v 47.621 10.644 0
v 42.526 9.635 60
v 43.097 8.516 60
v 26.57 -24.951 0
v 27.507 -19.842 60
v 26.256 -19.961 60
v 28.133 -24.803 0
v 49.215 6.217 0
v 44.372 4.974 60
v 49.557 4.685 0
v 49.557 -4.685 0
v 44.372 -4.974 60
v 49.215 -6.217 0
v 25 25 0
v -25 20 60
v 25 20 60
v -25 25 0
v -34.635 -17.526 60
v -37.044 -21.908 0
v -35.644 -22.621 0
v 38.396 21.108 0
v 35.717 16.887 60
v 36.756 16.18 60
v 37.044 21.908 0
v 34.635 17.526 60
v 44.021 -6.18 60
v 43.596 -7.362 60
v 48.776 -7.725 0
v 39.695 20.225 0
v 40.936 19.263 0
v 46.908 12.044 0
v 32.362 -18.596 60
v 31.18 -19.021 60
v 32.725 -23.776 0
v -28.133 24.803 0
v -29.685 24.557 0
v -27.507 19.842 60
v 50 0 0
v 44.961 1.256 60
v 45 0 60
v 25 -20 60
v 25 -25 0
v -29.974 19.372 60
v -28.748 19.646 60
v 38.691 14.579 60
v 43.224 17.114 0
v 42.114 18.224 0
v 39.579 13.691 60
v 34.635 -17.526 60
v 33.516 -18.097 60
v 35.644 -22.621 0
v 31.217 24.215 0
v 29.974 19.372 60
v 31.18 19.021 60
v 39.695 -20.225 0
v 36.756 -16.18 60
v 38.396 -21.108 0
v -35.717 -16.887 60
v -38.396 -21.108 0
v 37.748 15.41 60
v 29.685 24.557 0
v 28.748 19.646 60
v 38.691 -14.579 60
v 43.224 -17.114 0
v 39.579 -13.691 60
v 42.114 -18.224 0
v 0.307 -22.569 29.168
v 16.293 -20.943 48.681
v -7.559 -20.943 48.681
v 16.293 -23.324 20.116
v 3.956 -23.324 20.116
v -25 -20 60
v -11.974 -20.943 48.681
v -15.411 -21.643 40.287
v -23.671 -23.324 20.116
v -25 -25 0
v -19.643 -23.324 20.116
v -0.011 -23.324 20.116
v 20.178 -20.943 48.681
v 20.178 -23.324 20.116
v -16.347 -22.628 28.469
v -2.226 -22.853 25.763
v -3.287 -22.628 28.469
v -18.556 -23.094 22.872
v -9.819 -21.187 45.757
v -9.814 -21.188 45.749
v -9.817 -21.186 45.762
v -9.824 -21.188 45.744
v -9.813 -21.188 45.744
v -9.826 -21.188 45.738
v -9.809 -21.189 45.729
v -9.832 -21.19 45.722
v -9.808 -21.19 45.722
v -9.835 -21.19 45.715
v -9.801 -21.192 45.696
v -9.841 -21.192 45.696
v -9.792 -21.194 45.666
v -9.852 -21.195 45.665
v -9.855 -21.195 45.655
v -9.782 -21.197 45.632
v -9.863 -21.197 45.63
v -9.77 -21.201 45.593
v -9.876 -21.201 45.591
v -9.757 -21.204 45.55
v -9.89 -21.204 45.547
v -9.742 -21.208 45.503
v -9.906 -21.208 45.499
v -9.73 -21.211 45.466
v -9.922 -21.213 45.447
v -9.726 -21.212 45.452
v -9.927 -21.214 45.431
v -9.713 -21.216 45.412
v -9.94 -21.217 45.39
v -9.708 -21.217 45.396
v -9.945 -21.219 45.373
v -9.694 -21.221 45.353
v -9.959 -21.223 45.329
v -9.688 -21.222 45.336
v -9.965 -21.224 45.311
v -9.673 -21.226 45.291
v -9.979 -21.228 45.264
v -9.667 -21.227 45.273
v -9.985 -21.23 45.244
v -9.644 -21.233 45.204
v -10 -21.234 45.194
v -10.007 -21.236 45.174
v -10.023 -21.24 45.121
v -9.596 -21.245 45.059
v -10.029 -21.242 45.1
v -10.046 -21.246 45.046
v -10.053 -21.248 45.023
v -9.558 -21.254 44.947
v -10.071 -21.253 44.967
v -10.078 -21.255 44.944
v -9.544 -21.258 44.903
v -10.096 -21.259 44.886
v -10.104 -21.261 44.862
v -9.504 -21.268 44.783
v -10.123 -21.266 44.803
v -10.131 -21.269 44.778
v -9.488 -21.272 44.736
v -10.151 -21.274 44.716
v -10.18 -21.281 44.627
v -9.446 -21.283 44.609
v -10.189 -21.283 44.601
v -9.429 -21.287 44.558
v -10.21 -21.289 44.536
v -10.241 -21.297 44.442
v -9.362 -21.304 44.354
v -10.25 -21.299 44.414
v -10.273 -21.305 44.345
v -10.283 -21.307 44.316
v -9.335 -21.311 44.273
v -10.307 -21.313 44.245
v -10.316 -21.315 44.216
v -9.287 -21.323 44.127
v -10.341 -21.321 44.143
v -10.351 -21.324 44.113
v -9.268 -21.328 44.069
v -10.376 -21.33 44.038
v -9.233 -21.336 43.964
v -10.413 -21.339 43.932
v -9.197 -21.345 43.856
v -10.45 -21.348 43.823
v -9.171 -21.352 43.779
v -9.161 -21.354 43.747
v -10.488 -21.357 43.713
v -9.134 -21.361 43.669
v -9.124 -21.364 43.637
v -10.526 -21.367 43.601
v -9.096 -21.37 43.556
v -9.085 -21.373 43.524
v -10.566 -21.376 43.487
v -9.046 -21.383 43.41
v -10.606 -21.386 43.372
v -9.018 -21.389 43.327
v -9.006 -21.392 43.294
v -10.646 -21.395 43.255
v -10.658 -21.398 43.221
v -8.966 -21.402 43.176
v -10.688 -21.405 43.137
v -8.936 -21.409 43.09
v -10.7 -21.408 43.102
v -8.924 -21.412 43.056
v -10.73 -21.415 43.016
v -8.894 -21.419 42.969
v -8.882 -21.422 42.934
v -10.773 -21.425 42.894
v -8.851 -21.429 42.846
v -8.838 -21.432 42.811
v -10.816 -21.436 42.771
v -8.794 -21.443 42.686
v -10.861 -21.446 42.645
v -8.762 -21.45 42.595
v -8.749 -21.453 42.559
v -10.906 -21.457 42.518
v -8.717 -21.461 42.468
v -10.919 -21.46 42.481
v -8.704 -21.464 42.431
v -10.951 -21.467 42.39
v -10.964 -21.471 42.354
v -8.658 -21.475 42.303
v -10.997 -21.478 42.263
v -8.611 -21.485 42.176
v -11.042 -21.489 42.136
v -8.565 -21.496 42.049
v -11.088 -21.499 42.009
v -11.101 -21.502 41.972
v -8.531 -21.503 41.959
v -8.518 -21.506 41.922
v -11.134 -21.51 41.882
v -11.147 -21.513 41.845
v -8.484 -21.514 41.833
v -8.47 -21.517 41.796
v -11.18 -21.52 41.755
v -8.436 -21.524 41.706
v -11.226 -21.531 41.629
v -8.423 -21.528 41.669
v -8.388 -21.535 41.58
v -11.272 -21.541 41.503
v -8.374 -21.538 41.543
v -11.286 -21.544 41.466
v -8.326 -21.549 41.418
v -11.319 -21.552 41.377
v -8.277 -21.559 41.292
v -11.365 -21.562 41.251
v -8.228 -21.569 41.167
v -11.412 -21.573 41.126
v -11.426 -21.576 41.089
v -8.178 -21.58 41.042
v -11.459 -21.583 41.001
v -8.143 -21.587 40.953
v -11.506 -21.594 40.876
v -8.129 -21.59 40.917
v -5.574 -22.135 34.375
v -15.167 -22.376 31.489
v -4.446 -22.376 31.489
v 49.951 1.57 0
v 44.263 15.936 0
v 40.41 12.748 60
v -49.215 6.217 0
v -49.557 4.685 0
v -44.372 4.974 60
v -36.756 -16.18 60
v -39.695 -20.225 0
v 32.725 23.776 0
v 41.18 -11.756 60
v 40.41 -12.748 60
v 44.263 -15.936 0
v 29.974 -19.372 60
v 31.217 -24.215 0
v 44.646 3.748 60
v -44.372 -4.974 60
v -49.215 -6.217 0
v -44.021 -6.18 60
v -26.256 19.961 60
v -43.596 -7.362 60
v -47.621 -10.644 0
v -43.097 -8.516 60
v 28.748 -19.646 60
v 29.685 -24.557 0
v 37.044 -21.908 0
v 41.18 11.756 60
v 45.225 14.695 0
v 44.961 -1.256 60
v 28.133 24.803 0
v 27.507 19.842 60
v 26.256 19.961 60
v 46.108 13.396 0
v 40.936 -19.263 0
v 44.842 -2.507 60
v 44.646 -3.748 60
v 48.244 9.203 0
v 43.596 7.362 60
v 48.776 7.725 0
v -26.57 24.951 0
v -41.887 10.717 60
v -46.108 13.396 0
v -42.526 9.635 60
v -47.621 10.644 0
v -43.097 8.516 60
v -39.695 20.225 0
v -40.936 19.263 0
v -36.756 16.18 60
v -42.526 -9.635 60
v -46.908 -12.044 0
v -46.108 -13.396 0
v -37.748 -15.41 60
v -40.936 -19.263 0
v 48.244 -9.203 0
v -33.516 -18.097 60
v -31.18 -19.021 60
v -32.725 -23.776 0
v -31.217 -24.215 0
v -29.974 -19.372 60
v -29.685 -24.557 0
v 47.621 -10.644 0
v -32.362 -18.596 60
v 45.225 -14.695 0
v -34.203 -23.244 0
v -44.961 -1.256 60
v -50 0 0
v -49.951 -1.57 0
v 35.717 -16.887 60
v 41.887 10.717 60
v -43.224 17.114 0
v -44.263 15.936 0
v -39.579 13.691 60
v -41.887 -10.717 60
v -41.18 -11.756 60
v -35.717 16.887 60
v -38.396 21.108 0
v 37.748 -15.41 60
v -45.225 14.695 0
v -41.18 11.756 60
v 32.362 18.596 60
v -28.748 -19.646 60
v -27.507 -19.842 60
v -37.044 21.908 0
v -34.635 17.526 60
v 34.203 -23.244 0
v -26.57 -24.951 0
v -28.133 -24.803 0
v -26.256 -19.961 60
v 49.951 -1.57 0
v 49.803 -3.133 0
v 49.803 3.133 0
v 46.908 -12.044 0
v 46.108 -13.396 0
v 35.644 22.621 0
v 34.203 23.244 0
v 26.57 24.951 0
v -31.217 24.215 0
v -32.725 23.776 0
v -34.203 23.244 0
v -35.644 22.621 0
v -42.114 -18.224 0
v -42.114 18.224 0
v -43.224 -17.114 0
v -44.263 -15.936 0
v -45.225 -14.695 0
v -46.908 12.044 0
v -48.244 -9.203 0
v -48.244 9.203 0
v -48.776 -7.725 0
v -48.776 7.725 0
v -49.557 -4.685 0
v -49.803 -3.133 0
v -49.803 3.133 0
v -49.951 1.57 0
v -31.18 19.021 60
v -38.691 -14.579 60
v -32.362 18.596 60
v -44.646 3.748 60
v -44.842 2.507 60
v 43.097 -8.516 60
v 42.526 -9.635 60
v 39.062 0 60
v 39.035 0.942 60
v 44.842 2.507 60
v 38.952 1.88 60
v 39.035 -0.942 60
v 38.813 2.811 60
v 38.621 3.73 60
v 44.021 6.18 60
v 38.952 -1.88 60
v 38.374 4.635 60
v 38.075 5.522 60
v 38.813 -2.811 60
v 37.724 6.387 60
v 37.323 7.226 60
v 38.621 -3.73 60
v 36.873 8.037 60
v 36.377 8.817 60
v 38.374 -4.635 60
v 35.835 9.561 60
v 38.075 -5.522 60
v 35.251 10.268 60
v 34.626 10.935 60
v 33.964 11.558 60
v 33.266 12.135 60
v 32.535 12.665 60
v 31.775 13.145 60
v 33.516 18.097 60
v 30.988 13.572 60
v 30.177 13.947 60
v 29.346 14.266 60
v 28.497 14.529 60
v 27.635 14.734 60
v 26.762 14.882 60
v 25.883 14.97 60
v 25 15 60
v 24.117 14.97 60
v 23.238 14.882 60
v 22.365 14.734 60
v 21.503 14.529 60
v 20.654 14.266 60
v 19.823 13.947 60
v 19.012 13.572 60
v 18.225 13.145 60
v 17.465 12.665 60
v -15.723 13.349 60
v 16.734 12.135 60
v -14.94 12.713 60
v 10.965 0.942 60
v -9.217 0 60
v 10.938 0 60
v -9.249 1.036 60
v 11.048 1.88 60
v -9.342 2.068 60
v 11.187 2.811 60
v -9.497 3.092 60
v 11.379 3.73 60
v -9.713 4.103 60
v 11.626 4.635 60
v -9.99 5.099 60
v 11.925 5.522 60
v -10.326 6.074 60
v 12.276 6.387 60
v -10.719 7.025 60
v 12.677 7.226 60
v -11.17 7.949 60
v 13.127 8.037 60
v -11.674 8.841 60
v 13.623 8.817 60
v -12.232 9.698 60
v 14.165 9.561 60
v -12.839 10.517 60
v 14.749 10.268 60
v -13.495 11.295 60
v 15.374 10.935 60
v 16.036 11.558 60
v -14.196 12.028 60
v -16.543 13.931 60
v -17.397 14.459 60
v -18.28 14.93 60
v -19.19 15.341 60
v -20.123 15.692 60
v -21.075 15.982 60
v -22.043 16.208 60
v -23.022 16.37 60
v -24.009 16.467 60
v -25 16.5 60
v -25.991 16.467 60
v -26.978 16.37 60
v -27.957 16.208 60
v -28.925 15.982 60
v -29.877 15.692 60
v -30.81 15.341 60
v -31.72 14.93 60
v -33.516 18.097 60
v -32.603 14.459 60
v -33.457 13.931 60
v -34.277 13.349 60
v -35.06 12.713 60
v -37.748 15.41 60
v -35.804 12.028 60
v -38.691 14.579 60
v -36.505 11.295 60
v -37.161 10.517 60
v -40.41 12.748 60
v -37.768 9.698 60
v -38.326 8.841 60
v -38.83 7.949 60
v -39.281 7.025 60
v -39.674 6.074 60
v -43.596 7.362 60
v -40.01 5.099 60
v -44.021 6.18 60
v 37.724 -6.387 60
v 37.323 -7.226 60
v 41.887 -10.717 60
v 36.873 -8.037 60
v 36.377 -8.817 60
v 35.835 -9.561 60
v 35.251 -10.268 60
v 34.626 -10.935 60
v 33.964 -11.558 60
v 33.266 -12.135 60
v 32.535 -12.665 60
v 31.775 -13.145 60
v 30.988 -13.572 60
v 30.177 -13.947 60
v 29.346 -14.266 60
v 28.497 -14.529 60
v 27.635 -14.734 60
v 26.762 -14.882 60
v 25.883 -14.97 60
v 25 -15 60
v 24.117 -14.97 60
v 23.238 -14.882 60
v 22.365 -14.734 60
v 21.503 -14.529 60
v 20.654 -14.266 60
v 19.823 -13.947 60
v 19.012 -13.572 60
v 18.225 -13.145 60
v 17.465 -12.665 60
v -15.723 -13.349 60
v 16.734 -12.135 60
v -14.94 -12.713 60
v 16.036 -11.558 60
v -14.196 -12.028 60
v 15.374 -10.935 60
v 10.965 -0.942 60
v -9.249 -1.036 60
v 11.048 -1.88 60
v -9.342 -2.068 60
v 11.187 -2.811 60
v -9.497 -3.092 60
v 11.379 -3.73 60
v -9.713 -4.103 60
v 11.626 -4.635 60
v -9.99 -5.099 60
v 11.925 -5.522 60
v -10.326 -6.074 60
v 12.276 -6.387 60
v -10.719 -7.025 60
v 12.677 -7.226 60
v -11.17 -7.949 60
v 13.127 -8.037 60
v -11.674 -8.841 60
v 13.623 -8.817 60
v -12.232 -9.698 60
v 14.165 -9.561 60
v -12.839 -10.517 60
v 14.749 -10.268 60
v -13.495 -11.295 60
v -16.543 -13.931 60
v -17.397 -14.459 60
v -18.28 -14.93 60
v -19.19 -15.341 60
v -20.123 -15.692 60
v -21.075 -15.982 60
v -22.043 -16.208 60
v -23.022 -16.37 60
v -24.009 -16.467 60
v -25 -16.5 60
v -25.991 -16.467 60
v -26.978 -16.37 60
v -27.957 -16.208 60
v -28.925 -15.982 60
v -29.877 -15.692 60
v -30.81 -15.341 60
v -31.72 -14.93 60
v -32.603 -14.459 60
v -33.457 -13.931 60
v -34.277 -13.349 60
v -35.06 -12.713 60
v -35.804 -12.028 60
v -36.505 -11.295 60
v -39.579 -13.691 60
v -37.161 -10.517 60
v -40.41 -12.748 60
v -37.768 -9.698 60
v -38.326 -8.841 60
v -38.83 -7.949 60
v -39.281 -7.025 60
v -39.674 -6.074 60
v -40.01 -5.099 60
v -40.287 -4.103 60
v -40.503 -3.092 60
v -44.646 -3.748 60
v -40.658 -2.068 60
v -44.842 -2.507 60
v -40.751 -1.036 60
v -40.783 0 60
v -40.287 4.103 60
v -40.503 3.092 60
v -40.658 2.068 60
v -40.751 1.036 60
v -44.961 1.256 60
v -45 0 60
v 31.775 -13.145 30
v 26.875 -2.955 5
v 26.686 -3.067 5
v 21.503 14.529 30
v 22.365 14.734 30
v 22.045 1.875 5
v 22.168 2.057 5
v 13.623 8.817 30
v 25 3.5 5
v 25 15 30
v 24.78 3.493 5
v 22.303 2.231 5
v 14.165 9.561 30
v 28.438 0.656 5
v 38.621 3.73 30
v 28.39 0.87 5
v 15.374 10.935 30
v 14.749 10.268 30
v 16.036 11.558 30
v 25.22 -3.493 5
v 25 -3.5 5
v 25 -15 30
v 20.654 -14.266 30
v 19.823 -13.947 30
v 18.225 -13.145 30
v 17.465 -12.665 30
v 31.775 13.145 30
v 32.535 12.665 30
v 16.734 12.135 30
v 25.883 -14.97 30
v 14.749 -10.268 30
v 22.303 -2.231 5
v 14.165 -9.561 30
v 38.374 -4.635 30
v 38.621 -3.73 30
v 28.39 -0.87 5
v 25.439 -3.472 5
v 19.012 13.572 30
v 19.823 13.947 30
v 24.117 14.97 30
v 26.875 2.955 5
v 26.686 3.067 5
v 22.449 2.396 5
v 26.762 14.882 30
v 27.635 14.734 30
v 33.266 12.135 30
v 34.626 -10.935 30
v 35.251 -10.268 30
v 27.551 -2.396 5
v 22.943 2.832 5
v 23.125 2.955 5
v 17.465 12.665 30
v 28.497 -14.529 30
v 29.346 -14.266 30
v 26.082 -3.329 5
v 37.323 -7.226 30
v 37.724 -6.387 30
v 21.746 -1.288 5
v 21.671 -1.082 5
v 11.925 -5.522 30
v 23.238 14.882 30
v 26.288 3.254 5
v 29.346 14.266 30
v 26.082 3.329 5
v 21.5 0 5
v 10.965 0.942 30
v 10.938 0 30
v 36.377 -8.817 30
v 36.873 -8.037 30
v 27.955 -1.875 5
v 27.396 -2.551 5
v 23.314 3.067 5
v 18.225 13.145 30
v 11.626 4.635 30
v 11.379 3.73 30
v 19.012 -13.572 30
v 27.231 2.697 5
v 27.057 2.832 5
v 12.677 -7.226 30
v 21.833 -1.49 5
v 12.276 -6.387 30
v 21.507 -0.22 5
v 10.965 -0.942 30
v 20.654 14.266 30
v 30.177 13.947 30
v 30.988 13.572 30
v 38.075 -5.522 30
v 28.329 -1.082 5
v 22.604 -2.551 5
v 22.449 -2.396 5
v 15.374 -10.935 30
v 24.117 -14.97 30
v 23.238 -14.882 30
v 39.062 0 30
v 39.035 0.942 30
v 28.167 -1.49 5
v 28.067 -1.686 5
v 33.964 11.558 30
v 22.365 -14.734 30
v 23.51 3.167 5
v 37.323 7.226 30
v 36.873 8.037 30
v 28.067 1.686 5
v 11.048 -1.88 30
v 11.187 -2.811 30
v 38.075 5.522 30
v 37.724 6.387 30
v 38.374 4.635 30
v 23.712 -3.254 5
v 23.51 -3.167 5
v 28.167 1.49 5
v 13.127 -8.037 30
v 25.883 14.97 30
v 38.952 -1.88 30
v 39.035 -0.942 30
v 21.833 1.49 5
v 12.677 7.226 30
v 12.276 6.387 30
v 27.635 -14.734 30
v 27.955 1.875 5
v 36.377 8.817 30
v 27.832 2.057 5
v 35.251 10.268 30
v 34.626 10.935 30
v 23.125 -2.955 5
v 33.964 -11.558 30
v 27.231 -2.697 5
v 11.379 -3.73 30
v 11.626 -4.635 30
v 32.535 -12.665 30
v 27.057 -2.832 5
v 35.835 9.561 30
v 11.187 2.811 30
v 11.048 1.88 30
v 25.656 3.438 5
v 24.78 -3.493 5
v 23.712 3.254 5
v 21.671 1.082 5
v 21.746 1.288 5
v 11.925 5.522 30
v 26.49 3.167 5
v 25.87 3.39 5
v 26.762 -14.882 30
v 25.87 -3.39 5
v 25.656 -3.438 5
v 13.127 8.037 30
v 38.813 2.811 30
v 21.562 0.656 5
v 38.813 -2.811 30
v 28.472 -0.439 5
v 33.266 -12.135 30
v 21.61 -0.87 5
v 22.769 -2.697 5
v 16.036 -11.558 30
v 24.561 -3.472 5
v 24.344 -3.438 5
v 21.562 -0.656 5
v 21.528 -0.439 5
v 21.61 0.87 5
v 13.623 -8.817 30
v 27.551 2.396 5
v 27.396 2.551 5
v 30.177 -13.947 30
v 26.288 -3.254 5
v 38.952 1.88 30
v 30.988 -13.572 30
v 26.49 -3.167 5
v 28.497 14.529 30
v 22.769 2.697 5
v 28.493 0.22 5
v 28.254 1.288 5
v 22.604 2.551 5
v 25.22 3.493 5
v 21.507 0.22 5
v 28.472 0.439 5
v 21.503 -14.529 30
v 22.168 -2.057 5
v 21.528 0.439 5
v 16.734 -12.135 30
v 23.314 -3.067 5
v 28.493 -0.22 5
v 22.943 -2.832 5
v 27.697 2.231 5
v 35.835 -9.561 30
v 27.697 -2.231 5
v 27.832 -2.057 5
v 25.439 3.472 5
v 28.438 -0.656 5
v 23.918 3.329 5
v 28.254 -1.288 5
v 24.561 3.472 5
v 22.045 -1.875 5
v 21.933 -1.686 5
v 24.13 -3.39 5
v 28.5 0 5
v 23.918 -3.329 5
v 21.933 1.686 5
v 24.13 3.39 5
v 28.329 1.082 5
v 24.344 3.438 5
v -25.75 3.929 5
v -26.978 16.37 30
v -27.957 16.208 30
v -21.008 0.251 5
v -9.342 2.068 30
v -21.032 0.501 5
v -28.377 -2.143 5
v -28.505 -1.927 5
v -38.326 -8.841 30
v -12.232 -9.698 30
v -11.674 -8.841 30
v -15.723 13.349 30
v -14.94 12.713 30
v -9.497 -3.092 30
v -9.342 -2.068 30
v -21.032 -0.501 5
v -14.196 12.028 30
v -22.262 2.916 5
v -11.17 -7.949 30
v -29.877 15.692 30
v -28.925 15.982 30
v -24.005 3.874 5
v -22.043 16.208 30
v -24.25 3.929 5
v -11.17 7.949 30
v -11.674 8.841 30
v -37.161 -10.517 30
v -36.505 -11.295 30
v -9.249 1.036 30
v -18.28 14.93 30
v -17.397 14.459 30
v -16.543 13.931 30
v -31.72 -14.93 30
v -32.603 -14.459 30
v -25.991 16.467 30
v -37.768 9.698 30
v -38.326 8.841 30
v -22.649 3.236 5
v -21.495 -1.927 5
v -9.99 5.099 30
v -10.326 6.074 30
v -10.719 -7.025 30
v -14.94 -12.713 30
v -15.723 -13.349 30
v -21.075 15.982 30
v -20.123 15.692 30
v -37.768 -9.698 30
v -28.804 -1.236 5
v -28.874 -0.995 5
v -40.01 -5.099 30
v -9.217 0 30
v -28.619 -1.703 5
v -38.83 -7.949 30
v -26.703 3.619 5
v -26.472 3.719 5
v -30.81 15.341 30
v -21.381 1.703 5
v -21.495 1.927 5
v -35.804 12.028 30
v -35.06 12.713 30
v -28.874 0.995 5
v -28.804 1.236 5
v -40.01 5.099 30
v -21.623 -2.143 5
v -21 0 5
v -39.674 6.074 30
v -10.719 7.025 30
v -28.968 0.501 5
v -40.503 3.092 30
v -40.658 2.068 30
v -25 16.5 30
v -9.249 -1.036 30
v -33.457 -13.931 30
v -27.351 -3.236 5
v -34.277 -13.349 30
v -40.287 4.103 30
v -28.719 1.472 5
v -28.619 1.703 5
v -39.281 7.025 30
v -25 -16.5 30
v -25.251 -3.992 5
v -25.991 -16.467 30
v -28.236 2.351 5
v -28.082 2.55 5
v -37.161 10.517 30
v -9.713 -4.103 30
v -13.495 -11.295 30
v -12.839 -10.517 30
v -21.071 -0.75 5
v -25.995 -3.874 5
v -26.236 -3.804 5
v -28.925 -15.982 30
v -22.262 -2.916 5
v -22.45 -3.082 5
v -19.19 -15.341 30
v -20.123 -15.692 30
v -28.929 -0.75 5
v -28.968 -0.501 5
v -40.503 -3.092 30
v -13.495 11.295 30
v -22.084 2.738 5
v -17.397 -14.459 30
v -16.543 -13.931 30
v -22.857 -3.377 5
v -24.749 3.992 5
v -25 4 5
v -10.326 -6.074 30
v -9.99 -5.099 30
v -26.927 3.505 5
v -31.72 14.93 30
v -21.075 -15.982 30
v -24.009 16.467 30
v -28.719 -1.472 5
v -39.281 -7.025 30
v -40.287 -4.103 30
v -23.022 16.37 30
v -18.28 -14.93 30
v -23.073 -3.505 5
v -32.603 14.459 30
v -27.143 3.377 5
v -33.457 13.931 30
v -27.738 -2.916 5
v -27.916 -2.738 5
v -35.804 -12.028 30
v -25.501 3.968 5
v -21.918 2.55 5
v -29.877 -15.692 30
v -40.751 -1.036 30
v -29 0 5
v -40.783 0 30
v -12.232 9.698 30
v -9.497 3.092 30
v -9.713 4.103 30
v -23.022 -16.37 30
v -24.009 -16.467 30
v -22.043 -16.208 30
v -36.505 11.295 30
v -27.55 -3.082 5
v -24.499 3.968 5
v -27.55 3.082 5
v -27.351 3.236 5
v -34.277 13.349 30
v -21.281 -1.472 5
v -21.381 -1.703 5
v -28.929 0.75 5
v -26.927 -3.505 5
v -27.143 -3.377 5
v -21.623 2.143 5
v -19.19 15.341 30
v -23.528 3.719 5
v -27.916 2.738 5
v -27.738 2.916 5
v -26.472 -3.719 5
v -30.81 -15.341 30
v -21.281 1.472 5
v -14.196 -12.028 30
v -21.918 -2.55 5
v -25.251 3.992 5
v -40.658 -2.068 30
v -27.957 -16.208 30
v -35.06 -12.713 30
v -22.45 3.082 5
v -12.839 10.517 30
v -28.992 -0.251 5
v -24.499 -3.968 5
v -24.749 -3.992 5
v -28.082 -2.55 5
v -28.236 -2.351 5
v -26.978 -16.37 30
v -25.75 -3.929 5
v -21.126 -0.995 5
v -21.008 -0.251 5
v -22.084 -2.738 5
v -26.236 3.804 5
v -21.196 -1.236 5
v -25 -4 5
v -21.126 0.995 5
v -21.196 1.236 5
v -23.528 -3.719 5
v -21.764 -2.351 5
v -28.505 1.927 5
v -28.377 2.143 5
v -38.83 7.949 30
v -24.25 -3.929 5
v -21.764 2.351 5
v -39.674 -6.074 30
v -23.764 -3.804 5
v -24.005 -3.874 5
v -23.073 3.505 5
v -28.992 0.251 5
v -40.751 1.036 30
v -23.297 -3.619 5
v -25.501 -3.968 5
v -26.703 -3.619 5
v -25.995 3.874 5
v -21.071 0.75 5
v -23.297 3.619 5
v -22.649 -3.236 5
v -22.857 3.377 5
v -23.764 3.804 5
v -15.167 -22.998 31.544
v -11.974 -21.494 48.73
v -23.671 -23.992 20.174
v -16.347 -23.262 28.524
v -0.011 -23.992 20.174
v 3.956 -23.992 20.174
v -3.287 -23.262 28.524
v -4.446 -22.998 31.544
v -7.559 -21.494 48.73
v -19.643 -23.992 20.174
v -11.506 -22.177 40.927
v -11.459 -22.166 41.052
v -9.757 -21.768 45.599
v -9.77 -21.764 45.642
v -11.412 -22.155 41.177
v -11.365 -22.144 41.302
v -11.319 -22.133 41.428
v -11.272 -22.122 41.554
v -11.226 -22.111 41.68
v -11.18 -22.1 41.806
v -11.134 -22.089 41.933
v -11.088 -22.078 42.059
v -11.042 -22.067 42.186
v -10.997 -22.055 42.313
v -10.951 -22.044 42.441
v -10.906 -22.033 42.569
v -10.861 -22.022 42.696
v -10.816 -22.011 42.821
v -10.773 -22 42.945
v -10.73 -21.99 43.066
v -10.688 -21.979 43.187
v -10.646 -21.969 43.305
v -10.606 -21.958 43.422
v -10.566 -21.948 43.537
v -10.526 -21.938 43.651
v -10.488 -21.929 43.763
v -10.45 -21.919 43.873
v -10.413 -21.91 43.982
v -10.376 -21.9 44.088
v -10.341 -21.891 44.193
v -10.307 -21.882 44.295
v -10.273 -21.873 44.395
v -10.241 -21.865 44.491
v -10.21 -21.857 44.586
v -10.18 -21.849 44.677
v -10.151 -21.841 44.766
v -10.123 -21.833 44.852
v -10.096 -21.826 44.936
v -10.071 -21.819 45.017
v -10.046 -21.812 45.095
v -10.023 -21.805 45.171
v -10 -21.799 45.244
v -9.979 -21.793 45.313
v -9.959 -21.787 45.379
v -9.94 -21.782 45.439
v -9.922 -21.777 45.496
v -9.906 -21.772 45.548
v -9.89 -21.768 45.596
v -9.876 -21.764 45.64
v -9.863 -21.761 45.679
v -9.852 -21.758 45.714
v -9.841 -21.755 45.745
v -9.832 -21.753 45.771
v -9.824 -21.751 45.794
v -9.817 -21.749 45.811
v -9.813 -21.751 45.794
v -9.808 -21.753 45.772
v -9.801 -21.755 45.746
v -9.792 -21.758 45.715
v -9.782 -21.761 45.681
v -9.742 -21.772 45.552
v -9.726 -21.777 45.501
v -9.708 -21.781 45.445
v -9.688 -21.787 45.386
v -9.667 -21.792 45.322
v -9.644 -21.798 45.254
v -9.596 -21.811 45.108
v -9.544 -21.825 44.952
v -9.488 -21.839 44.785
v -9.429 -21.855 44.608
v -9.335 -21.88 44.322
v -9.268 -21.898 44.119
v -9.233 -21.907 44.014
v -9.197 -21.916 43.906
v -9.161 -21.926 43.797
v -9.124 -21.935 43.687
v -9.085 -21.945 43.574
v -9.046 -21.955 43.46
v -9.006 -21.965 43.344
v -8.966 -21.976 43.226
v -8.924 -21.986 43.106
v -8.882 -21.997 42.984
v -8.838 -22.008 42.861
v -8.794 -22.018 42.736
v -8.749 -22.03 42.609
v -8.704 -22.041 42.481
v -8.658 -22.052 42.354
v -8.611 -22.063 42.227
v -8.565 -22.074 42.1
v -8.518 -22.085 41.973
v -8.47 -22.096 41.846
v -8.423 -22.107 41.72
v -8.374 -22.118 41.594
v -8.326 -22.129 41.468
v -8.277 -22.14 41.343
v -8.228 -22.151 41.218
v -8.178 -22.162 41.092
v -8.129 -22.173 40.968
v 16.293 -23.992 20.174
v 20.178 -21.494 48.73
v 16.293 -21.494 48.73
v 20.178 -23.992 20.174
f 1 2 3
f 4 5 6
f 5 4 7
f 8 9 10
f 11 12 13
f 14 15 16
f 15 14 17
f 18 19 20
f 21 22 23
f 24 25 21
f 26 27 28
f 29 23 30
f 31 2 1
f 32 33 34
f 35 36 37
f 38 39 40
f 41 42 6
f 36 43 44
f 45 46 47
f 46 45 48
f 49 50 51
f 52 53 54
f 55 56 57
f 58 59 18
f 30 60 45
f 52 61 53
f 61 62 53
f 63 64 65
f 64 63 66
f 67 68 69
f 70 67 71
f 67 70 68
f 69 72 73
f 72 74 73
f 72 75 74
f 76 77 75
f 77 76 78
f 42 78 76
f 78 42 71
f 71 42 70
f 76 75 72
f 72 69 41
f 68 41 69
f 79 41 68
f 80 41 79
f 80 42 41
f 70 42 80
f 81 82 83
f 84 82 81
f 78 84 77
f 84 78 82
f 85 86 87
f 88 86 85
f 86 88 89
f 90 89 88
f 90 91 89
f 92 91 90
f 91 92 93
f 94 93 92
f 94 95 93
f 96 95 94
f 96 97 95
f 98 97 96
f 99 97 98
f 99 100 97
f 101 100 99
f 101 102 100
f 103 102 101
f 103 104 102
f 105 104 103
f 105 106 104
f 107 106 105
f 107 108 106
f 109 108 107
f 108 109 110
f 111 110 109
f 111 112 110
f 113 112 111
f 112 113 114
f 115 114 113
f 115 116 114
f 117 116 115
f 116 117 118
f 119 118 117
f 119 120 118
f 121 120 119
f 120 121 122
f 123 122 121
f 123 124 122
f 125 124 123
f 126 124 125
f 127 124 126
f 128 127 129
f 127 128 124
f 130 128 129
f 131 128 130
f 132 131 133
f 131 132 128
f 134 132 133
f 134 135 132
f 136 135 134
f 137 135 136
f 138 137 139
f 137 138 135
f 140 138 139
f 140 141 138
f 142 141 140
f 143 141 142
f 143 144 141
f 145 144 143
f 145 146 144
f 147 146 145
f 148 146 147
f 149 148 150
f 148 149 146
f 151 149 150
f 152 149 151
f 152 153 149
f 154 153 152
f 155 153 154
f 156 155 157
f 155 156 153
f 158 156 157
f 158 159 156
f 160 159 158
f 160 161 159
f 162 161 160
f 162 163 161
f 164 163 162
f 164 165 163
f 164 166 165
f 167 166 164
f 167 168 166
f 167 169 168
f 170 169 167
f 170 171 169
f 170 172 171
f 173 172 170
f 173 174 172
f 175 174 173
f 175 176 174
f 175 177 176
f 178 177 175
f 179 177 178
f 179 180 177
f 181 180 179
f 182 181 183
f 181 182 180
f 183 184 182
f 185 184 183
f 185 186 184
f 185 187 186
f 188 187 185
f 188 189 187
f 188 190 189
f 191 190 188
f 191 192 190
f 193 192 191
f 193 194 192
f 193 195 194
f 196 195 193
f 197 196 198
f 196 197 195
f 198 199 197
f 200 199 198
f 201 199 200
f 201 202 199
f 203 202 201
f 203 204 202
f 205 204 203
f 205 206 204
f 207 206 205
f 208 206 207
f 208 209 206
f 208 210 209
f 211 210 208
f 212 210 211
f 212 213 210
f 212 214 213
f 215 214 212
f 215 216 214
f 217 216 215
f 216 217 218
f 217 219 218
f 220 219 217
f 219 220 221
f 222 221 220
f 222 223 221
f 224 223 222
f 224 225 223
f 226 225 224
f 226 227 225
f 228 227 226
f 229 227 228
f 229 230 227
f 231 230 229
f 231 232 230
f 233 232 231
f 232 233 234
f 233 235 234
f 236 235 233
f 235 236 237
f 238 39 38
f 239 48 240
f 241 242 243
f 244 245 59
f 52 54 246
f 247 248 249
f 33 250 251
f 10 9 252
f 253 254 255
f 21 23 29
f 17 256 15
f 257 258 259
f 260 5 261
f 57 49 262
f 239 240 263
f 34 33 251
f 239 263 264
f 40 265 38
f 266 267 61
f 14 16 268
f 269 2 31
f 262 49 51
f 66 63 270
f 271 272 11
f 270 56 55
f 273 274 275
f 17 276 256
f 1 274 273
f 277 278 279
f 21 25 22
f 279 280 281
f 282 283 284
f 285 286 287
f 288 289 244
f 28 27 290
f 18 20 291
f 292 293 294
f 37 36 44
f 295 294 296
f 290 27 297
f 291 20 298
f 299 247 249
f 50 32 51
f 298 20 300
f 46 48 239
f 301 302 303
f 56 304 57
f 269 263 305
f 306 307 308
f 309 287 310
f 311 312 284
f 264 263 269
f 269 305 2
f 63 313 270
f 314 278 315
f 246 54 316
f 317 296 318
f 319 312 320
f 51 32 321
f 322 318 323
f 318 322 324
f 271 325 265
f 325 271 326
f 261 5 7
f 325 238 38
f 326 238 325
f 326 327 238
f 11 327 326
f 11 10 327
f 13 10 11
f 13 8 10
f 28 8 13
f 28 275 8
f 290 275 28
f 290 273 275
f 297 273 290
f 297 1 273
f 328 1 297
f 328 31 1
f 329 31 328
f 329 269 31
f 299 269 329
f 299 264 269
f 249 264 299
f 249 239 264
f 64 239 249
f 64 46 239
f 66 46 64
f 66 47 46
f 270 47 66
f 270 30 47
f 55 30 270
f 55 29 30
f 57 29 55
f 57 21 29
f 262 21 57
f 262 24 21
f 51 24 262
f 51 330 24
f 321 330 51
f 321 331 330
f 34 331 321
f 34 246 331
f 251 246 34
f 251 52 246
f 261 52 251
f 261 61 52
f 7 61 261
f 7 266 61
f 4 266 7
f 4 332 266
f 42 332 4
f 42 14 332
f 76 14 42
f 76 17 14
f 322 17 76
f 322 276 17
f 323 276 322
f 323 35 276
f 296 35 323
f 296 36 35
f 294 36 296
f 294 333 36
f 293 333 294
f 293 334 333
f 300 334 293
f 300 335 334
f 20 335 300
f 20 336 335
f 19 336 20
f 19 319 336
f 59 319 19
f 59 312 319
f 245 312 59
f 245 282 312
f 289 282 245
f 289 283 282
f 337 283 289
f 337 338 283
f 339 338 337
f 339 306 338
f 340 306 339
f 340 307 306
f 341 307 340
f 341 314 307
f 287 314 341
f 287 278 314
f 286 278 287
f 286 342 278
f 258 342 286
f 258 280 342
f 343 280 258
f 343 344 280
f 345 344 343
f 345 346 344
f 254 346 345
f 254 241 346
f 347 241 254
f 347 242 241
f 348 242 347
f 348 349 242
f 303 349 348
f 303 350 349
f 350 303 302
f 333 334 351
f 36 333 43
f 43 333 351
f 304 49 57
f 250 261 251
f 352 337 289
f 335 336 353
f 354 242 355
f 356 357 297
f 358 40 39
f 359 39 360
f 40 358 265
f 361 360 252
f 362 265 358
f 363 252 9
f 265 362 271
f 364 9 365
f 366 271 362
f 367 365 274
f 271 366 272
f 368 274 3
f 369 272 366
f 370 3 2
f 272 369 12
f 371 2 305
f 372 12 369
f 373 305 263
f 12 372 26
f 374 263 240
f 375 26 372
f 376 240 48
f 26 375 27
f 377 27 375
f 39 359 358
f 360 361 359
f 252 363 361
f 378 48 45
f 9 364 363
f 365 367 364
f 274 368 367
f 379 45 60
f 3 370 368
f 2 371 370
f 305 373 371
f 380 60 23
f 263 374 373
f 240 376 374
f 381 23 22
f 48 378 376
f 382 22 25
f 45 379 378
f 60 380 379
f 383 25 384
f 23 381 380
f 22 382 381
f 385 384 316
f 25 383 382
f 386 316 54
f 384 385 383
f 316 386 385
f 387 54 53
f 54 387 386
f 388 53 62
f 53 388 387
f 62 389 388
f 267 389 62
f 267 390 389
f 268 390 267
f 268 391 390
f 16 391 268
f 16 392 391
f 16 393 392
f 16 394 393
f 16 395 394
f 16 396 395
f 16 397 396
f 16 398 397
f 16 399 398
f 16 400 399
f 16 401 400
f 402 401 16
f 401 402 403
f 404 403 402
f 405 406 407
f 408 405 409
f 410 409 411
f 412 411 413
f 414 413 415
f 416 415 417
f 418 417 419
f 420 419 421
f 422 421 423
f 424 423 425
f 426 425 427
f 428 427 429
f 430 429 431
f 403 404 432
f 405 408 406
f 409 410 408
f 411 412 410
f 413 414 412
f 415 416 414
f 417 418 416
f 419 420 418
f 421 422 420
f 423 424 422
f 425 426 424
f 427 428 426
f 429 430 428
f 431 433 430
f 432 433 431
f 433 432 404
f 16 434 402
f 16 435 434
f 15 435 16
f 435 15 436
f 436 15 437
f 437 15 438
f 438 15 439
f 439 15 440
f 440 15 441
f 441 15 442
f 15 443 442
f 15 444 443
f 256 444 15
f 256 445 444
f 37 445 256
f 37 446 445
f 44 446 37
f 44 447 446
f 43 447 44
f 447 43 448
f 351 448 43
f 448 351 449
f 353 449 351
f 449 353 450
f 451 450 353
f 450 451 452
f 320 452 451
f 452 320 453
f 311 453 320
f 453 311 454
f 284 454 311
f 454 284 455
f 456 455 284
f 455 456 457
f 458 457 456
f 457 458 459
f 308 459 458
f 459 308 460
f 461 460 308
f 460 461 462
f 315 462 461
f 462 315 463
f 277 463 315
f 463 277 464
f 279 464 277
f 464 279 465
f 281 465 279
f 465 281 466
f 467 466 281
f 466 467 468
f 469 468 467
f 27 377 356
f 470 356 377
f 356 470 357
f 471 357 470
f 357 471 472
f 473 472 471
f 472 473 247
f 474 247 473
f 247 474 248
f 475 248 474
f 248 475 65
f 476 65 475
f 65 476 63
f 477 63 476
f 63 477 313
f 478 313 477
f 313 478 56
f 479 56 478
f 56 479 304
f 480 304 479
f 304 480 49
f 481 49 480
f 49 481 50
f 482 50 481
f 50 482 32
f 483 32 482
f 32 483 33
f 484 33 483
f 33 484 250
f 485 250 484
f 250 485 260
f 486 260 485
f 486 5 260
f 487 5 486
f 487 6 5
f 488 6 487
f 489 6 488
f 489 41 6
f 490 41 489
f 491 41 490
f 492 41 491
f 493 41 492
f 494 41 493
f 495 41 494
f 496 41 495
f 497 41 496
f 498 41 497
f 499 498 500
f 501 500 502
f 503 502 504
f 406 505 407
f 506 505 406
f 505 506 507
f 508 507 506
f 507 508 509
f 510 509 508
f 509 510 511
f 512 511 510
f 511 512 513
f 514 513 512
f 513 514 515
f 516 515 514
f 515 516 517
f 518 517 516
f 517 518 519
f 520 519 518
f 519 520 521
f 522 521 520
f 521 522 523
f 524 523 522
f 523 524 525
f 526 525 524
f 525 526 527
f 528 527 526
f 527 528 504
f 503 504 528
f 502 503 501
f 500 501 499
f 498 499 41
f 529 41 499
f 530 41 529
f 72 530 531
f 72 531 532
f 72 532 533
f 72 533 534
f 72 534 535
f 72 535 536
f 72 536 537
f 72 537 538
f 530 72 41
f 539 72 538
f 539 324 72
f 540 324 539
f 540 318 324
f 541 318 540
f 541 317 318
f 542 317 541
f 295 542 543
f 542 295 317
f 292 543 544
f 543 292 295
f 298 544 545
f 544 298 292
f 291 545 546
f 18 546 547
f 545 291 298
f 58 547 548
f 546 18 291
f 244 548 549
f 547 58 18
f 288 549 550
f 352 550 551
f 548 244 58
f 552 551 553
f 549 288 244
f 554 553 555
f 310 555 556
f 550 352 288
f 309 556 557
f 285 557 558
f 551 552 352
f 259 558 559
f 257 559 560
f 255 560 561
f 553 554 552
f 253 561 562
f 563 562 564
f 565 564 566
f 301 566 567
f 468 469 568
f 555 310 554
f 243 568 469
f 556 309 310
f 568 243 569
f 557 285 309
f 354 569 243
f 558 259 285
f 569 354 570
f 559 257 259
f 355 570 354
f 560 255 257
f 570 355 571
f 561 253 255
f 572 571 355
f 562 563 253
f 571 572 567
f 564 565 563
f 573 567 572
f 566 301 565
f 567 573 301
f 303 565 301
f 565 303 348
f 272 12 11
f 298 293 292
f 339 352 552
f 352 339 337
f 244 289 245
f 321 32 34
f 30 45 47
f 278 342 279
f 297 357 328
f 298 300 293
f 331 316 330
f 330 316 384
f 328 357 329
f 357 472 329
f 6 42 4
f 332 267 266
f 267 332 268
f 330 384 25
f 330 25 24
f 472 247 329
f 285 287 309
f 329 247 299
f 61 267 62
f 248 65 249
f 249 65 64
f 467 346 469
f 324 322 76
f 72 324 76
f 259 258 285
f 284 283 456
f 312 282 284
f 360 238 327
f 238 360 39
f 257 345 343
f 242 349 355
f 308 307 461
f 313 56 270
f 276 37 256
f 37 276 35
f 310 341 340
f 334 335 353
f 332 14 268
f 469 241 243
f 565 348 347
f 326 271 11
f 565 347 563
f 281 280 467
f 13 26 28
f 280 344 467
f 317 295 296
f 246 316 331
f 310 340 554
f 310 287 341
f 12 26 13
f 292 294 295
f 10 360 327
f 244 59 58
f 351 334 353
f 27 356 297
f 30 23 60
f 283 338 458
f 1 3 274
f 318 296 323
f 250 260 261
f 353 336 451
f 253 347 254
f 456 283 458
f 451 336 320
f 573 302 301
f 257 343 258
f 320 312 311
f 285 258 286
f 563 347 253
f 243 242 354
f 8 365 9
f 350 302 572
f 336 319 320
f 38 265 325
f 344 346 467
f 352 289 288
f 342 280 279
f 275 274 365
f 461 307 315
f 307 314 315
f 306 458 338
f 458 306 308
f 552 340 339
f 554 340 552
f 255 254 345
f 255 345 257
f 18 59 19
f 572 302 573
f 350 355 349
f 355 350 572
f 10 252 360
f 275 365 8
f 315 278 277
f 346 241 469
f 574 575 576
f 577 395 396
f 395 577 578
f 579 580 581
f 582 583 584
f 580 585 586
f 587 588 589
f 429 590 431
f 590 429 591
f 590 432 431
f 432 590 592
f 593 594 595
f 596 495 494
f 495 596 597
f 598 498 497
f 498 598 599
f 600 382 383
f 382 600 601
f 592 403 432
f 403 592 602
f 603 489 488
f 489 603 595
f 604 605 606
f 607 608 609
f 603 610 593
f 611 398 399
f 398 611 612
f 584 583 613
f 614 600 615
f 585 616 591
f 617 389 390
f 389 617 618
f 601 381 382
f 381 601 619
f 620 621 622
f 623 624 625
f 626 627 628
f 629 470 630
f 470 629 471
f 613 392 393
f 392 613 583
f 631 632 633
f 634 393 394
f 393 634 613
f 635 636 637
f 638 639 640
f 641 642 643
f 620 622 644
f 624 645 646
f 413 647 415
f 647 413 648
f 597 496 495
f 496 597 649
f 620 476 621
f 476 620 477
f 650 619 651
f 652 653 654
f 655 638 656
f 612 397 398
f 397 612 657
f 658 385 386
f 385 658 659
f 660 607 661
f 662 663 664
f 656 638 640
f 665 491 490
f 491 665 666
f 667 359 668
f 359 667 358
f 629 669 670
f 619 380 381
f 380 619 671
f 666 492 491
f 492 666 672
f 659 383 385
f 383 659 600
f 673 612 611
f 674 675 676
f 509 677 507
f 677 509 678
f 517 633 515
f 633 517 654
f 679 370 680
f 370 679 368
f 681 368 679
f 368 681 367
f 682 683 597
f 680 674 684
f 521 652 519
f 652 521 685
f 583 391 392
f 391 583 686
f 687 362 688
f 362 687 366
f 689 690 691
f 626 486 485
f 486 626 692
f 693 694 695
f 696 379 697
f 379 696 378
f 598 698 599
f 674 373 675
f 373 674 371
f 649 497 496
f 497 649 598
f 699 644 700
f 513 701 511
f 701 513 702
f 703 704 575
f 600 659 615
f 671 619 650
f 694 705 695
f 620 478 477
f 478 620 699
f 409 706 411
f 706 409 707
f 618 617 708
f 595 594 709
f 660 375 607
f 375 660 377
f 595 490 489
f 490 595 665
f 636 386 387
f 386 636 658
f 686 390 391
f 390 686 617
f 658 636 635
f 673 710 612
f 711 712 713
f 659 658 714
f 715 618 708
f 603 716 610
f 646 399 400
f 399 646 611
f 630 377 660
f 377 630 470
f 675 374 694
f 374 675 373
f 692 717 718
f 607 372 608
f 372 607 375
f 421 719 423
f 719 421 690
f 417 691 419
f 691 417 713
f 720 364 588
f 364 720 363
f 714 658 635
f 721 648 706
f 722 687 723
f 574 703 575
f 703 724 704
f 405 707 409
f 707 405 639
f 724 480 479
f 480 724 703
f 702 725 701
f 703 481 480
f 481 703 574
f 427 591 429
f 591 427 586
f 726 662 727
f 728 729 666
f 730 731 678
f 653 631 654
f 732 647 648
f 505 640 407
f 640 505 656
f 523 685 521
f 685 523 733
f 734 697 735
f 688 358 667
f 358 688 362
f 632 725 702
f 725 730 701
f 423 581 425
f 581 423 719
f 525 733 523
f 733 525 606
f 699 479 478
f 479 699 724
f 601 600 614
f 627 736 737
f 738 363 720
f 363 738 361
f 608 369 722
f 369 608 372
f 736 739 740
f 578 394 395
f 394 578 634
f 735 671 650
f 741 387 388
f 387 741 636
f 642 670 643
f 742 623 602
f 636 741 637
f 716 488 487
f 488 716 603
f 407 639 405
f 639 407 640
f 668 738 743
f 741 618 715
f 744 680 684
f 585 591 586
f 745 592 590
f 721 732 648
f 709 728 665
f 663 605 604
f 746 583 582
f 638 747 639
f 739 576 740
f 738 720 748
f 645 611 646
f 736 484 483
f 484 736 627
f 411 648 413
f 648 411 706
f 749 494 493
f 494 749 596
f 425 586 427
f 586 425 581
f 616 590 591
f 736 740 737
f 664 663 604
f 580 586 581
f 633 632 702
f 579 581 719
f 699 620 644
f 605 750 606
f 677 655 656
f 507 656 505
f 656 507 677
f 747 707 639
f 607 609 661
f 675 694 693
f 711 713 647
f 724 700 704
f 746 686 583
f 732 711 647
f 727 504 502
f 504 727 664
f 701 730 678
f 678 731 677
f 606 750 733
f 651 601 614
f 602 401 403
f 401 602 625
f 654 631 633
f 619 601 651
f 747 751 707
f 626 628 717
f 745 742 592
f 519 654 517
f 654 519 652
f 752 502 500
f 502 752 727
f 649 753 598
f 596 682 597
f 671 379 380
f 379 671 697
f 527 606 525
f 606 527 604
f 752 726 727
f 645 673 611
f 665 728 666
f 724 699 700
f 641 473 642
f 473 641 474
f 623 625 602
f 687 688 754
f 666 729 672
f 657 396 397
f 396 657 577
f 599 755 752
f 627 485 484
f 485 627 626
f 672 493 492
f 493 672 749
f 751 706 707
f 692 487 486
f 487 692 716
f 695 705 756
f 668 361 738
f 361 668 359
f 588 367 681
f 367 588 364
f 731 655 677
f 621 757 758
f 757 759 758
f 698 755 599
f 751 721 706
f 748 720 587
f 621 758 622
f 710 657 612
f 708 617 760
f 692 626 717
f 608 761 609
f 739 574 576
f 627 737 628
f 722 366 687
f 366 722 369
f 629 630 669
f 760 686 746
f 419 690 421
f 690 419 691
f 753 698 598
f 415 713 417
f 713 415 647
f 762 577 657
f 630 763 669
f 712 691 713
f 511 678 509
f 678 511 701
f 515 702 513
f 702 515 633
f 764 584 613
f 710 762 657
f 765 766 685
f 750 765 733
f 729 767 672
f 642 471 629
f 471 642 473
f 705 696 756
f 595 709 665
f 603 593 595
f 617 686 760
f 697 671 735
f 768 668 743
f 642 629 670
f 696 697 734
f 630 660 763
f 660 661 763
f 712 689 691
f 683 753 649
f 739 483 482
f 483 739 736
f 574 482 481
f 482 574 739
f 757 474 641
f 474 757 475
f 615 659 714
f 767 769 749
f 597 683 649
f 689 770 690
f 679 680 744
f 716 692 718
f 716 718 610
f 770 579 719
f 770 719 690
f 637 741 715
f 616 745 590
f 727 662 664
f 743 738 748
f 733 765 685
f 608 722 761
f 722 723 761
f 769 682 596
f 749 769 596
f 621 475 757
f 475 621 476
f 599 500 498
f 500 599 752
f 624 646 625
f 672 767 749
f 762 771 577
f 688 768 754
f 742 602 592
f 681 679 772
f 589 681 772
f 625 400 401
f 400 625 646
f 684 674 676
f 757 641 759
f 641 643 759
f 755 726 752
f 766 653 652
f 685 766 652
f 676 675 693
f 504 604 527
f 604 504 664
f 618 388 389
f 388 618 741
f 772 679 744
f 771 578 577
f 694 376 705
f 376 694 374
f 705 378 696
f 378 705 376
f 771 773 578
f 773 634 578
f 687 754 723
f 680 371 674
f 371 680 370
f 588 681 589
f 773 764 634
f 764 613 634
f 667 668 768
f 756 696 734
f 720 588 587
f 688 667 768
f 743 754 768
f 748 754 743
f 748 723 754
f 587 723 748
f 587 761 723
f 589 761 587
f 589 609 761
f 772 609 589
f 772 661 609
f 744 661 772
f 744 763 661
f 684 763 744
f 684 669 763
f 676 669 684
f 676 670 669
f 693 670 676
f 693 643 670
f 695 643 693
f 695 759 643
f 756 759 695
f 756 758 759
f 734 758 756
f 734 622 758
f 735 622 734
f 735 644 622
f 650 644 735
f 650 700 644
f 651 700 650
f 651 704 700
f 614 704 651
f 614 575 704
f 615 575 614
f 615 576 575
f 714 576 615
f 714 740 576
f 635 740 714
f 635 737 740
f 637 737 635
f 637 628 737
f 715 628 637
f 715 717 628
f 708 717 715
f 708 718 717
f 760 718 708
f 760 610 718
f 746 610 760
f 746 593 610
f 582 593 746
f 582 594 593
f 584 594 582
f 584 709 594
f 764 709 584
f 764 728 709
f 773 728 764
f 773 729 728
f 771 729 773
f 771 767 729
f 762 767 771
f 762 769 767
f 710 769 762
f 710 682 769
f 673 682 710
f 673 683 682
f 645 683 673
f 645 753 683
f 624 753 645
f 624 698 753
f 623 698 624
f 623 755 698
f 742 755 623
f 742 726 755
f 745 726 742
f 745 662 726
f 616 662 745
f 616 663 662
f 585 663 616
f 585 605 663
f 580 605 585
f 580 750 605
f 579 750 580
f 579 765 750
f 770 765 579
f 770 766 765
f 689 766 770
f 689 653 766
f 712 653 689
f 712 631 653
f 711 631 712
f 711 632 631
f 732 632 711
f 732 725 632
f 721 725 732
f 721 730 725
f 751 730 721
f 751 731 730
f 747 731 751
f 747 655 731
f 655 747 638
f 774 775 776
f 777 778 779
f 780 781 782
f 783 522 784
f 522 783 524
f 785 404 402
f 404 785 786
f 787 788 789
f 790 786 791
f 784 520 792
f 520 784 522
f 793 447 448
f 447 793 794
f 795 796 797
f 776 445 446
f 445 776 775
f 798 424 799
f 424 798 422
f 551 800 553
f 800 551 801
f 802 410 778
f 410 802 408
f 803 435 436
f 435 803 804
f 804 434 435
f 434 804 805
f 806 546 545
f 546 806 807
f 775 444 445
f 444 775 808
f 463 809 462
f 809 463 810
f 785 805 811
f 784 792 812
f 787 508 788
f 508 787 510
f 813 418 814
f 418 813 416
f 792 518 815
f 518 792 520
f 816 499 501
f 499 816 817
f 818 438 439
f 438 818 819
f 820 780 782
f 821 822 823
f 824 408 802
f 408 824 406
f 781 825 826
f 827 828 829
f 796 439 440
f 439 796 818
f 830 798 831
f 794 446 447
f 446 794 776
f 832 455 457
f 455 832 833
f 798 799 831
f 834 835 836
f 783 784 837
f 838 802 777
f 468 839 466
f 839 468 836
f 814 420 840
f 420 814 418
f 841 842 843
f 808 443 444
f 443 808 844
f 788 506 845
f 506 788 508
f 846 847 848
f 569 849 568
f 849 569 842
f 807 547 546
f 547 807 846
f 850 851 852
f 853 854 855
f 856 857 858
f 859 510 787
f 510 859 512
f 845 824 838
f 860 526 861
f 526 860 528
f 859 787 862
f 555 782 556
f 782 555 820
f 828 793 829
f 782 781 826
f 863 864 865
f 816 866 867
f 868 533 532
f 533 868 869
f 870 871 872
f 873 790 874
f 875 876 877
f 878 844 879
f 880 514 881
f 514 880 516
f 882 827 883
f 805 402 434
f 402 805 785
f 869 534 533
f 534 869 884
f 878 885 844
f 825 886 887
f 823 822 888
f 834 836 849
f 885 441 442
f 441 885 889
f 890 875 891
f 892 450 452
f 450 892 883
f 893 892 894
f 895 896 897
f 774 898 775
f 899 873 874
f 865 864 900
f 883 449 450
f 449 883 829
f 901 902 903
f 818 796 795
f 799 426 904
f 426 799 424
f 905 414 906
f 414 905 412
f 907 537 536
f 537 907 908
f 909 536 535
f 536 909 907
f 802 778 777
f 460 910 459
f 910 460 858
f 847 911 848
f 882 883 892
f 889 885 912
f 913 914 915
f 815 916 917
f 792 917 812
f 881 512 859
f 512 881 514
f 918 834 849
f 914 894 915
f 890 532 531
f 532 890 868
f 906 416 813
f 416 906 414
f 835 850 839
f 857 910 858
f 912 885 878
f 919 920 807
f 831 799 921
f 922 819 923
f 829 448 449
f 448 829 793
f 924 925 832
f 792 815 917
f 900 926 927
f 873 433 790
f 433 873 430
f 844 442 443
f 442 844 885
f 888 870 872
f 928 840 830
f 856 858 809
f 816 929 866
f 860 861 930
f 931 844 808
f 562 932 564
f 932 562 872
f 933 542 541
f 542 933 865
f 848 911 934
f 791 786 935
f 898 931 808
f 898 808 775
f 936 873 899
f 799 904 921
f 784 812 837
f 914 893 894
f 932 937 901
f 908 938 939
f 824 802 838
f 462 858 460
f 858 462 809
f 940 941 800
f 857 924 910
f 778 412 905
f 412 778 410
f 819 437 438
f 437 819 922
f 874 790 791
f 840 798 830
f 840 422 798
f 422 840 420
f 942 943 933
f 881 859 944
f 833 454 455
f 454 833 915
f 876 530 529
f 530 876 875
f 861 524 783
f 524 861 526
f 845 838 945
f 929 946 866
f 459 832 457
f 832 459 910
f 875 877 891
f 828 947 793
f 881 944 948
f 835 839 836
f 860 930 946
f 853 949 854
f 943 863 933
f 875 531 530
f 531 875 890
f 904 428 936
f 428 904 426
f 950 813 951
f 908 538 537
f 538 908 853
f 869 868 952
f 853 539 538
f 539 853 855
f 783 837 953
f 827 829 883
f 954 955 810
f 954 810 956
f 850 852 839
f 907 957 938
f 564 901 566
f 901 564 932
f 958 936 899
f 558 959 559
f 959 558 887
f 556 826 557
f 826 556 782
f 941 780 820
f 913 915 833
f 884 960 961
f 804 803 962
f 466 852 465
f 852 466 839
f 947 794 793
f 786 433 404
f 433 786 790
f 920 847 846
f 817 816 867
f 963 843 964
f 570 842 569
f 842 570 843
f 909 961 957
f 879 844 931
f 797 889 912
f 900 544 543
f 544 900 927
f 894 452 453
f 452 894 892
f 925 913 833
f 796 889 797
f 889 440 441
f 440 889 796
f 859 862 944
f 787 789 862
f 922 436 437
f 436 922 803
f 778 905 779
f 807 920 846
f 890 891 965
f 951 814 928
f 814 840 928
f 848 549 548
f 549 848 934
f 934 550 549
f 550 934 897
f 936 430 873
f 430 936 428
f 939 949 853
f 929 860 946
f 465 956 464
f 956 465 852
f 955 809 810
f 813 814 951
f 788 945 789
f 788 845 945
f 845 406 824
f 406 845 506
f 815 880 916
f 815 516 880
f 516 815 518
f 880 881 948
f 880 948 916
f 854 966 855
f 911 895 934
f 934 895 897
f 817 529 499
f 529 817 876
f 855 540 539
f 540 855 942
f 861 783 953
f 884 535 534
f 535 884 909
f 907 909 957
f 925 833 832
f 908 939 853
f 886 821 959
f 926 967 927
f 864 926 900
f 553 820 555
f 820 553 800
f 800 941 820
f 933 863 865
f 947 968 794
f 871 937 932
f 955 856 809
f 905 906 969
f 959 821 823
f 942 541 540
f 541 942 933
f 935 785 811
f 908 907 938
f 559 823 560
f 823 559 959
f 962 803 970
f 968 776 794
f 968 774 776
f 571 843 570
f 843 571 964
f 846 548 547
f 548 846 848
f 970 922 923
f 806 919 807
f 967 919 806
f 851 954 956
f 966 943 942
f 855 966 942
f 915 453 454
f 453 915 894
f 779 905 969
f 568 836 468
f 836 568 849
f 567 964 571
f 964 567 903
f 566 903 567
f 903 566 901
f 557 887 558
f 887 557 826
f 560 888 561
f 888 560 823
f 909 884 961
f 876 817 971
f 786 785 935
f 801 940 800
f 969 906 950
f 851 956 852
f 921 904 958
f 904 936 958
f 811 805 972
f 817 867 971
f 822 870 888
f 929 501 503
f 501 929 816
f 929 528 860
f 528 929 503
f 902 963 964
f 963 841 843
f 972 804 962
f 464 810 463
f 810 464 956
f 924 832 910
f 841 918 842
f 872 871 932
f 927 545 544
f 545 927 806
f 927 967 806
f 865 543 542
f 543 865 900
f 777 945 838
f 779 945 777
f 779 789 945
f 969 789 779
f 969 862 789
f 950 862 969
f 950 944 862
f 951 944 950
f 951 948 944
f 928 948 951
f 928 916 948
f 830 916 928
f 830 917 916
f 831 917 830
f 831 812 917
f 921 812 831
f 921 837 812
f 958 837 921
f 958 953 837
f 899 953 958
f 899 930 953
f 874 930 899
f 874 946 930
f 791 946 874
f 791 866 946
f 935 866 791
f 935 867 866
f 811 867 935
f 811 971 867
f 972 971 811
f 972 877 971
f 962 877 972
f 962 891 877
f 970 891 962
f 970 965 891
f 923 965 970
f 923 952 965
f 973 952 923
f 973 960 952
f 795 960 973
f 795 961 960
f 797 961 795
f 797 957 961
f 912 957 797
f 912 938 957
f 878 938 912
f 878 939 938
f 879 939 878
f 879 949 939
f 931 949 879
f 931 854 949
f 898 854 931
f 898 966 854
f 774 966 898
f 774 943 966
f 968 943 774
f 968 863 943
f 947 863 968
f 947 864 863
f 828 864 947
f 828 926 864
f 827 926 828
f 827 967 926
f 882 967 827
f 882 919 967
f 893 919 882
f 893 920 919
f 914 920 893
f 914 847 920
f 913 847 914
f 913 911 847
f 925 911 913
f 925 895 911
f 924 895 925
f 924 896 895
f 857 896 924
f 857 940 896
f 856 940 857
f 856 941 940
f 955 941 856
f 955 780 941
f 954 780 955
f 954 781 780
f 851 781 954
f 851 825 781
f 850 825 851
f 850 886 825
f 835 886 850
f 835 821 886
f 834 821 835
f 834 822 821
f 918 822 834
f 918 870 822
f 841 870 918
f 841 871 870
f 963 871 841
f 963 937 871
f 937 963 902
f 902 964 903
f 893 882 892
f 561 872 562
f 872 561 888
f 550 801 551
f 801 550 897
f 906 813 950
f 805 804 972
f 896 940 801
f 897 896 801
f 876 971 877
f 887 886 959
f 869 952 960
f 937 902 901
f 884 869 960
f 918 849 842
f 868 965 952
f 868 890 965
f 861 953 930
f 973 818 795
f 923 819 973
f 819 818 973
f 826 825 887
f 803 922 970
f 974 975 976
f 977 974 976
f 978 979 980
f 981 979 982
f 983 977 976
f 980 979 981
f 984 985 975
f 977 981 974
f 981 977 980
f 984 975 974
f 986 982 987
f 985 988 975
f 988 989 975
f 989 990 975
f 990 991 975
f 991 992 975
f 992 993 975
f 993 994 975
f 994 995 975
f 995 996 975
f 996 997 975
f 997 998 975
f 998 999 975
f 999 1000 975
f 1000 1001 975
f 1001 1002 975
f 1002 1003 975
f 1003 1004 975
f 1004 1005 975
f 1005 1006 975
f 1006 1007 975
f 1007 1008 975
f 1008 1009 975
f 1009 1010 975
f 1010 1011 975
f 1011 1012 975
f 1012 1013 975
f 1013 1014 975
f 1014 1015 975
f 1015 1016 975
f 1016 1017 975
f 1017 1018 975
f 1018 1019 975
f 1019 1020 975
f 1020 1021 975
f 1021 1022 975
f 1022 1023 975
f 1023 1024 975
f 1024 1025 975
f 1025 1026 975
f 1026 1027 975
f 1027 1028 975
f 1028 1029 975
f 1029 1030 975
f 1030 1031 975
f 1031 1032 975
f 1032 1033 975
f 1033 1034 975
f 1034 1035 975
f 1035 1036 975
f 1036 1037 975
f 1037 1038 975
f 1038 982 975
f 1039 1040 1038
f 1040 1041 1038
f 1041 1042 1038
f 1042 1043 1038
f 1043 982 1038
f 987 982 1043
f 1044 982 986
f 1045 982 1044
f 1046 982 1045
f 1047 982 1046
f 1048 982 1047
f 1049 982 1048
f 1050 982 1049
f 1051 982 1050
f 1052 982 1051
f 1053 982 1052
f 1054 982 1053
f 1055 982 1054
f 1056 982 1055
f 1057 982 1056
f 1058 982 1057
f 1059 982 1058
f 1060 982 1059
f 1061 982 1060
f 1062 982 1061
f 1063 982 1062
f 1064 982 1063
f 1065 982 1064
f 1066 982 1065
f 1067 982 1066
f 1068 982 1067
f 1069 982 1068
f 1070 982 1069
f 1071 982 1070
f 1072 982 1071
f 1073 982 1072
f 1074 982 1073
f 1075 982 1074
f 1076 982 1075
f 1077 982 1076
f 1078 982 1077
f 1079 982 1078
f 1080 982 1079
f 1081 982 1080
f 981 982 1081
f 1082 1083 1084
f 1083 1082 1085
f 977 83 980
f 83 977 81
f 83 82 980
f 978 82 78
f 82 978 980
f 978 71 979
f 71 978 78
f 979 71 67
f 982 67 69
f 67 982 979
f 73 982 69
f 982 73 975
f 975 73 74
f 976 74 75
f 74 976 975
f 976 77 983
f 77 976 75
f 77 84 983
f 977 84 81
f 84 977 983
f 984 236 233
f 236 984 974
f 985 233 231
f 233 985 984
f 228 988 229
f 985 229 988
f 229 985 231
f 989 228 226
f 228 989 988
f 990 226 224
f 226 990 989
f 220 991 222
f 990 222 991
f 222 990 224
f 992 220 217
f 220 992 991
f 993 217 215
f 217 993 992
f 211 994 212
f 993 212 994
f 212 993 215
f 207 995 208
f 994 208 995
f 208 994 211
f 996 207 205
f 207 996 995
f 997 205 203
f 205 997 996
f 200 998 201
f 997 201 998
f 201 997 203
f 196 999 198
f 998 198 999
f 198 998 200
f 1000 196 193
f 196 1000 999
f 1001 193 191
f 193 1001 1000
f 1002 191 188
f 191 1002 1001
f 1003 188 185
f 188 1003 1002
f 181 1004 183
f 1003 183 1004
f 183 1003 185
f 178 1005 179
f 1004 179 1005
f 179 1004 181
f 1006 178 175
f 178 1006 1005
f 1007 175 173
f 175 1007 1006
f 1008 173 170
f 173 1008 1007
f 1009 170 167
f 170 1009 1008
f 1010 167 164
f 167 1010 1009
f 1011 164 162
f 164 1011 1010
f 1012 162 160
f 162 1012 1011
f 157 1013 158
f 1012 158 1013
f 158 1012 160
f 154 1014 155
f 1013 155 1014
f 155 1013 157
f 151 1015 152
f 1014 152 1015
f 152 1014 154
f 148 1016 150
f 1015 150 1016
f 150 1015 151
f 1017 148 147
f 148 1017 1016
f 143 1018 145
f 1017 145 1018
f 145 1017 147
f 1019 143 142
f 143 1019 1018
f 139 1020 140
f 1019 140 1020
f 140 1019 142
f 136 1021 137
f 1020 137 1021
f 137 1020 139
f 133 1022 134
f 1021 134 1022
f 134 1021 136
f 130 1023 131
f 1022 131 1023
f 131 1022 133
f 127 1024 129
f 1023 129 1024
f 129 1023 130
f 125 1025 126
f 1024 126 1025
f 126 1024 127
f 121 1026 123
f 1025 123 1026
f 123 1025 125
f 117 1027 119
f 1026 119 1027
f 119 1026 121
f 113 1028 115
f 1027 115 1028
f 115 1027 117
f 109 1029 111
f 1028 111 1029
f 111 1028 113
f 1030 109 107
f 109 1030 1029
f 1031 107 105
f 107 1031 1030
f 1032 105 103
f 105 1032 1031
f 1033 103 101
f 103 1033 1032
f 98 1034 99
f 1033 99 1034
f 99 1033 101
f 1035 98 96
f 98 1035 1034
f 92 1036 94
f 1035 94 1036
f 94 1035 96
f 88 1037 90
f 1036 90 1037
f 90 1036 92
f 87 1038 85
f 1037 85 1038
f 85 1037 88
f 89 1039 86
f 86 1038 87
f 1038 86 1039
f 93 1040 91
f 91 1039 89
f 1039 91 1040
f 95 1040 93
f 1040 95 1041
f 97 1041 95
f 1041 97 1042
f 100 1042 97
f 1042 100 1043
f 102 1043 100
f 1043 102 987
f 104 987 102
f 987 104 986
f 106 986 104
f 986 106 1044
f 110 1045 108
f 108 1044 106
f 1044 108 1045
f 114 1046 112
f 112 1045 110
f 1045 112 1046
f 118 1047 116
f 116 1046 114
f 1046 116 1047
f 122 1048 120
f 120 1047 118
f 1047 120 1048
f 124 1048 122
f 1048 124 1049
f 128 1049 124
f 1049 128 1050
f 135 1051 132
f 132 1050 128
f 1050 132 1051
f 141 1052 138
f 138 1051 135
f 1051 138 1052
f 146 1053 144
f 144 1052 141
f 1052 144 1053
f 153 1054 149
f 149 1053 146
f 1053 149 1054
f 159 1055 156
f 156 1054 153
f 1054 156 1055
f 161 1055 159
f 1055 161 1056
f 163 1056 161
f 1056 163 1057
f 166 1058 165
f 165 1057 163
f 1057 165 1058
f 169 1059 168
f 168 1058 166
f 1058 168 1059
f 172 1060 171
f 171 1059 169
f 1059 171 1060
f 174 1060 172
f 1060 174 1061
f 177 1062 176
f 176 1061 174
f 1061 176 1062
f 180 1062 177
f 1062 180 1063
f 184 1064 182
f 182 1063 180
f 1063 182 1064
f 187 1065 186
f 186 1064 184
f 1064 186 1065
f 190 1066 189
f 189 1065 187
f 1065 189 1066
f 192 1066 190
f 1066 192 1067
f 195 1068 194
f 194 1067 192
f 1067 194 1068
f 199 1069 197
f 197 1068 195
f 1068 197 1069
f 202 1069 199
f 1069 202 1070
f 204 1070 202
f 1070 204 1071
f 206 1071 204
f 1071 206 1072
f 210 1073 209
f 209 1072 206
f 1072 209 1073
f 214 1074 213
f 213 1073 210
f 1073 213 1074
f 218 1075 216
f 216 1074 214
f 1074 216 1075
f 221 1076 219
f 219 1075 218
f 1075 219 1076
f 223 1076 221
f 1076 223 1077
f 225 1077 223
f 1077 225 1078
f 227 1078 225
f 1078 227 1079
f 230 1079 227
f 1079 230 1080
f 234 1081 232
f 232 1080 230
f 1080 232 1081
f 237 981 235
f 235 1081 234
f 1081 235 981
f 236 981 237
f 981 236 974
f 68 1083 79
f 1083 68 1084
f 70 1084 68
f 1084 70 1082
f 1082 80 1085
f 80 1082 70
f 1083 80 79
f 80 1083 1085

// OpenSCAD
$fn=100;

module pen(d1 = 30, d2= 32, d3 = 7) {
    hull() {
        translate([0,0, 30]) scale([d1/d2, 1, 1]) cylinder(d=d1, h=31);
        translate([0,0, 5]) cylinder(h=1, d=d3);
    };
}

module aaa() {
    difference() {
        hull() {
            translate([25,0,0]) cylinder(d1=50, d2=40, h=60);
            translate([-25,0,0]) cylinder(d1=50, d2=40, h=60);
        };
        translate([25,0,0]) pen(30, 32, 7);
        translate([-25,0,0]) pen(33, 34.5, 8);
    }
}

aaa();
color("green") 
  translate([0, -22, 20]) 
  rotate([85, 0, 0]) 
  linear_extrude(2) 
    text("A I", size =30, halign="center");
